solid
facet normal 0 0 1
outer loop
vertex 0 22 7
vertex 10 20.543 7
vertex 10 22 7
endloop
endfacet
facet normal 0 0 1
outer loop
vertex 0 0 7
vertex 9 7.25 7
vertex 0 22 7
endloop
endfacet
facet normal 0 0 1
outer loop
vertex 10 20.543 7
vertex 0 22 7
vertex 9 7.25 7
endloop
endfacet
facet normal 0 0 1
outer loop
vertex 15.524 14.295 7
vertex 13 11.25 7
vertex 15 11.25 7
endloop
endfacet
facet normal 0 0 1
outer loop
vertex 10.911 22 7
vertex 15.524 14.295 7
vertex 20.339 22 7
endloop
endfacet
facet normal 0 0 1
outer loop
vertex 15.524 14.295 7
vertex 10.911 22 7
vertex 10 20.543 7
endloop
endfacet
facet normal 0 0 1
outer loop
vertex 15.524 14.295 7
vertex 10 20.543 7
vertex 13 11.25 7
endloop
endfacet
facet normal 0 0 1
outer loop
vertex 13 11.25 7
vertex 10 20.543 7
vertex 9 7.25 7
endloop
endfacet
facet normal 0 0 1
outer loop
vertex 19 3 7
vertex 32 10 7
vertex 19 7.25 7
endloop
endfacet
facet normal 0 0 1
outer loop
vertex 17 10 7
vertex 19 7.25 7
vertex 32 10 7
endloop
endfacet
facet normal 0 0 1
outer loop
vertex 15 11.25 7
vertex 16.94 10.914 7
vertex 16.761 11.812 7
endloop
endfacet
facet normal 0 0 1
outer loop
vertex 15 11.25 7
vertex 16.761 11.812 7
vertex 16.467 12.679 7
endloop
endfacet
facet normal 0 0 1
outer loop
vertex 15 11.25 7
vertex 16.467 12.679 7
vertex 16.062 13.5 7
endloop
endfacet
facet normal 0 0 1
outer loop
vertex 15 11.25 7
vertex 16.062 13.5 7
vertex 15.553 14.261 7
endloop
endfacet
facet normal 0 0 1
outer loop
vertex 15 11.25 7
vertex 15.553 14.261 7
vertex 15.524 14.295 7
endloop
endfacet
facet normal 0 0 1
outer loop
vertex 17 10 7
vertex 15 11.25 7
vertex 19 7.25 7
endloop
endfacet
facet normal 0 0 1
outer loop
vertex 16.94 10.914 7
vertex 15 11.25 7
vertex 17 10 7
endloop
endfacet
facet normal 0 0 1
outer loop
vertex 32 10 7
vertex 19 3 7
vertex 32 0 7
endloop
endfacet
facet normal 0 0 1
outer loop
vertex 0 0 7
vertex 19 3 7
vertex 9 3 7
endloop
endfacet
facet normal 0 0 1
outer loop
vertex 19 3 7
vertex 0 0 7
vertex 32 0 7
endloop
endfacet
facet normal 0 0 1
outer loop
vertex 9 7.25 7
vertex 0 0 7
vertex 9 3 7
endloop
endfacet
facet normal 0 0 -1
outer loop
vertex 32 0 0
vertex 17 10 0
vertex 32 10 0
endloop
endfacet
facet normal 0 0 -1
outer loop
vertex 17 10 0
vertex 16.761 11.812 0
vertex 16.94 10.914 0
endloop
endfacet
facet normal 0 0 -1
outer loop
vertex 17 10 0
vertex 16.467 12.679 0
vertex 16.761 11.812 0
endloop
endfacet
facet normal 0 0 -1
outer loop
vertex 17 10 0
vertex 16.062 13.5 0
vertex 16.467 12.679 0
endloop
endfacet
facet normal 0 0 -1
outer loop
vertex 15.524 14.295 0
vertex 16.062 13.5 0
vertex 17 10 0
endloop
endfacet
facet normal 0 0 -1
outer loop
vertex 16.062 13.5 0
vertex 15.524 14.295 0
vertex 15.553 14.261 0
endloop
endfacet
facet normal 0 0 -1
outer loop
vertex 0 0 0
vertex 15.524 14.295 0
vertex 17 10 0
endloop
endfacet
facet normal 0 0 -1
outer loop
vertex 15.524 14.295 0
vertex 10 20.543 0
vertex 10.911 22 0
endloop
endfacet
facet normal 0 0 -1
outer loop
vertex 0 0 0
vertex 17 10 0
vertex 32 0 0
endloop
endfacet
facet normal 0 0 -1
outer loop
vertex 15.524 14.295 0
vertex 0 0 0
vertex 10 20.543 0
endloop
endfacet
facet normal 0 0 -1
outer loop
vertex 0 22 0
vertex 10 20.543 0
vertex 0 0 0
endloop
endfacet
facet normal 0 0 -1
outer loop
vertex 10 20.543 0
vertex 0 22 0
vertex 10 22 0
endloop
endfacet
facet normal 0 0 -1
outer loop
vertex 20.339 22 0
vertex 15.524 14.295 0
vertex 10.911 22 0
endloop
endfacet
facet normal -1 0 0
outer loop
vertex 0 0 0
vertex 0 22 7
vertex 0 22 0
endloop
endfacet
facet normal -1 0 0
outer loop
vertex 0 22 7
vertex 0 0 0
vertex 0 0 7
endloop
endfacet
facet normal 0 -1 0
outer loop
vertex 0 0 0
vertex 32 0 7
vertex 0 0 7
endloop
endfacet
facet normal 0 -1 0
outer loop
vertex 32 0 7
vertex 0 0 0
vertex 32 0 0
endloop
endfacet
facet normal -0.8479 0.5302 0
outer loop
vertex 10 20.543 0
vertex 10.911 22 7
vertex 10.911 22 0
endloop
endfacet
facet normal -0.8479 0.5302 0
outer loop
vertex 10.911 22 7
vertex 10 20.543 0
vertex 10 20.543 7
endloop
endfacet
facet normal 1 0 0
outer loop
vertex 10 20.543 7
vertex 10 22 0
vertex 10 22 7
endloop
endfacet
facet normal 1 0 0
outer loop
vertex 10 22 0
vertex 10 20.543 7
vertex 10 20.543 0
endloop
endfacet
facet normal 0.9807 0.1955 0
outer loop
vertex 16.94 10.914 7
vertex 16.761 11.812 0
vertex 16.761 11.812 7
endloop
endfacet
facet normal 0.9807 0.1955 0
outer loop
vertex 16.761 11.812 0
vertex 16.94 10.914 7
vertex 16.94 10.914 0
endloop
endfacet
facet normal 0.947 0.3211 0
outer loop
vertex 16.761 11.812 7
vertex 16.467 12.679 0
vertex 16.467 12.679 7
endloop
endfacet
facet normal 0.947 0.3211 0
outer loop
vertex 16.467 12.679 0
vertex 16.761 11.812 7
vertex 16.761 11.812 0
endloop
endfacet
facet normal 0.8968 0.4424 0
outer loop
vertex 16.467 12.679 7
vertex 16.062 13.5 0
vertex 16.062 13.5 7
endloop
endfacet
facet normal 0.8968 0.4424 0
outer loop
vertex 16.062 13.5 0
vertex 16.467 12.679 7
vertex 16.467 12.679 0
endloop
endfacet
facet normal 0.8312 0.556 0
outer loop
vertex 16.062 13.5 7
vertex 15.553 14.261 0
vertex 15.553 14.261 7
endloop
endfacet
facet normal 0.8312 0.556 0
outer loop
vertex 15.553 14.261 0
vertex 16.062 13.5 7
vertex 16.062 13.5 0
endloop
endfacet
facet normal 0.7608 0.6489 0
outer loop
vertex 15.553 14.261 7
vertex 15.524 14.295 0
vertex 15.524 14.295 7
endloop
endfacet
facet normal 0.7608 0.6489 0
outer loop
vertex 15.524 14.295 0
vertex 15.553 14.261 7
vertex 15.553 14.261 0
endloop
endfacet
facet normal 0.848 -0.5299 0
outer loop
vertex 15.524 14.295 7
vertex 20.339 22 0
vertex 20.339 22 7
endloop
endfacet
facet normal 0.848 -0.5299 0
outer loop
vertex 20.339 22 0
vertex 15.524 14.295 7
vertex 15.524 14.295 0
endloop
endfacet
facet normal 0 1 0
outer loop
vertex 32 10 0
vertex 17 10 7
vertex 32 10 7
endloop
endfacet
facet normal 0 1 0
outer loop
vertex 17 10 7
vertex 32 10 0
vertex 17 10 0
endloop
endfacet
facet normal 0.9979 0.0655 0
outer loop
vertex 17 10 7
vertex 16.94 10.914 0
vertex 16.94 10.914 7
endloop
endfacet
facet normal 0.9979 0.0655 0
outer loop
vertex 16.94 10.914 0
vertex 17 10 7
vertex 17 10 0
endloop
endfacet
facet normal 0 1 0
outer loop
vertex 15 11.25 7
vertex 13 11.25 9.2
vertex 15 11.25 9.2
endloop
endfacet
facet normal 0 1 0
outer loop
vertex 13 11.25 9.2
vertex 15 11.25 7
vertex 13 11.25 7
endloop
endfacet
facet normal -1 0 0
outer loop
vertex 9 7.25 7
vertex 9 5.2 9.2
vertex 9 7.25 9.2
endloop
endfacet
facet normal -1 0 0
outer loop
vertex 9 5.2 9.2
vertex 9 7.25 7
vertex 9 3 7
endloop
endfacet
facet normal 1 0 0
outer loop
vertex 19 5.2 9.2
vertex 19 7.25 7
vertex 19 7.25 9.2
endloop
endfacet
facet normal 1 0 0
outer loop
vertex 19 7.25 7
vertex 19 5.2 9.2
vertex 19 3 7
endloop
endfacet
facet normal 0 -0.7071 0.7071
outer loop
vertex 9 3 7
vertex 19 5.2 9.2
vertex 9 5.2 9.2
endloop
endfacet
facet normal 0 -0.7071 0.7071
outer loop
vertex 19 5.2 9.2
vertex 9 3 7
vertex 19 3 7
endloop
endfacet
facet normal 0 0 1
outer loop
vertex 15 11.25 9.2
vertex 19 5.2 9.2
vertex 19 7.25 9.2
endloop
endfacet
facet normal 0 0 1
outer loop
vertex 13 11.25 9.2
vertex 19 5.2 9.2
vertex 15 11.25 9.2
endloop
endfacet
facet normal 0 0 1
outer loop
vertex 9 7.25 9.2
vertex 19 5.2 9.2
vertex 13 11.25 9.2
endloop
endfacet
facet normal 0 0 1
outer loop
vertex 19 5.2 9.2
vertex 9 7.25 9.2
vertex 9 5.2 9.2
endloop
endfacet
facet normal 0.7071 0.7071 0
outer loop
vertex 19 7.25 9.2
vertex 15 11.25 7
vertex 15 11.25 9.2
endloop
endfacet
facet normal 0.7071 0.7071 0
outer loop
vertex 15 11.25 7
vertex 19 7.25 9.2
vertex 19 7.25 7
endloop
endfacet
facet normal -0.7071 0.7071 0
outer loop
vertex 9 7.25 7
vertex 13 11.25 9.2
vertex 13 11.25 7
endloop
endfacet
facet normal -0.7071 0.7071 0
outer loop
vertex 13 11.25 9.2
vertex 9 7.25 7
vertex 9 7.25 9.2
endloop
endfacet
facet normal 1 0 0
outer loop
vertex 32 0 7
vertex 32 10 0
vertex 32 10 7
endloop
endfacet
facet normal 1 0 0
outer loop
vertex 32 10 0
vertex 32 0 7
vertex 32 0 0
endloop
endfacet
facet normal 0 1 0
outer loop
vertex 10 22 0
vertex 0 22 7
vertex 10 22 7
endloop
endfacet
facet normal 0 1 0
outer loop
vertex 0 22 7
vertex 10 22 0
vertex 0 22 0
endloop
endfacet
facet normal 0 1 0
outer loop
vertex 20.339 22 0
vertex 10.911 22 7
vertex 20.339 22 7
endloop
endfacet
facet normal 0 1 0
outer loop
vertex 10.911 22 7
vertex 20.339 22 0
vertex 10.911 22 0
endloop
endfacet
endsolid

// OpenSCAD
// V6A experimental retained TPU foot. Units: mm.
// Default is ONE PLA coupon. Read V6A_README.md before printing.
// Full support preserves V5 height: with 2 mm sole assembled height is 243 mm.
// Full support is reference-only pending foot test and top/height reconciliation.
part = "coupon"; // coupon, foot, coupon_assembly, support_reference, support_assembly
$fn=48;

// Unchanged V5 geometry from original source.
W=150; H=234; T=7; frame=10; brace=8;
tab_w=22; tab_h=7; tab_t=7; tab_centers=[39,111];
module beam2d(x1,y1,x2,y2,w) {
 hull() { translate([x1,y1]) circle(d=w); translate([x2,y2]) circle(d=w); }
}
module frame2d() {
 union() {
  square([W,frame]); translate([0,H-frame]) square([W,frame]);
  translate([0,frame]) square([frame,H-2*frame]);
  translate([W-frame,frame]) square([frame,H-2*frame]);
  beam2d(frame-5,frame-5,W-frame+5,H-frame+5,brace);
  beam2d(W-frame+5,frame-5,frame-5,H-frame+5,brace);
  for(p=[[frame,frame],[W-frame,frame],[frame,H-frame],[W-frame,H-frame]])
   translate(p) circle(d=14);
 }
}
module base_support() {
 union() {
  linear_extrude(T) frame2d();
  for(c=tab_centers) translate([c-tab_w/2,H,0]) cube([tab_w,tab_h,tab_t]);
 }
}
// x along rail, y upward, z through rail thickness. Underside of rail: y=0.
sole=2;
wall=1.8;
clearance=0.25; // per face, UNCALIBRATED TPU trial; independent of PLA socket fit
catch_projection=2.2;
foot_length=28;
module cuboid(a,b) {translate(a) cube(b-a);}
module xy_prism(points,z0,z1) {translate([0,0,z0]) linear_extrude(z1-z0) polygon(points);}
module yz_prism(points,x0,x1) {
 multmatrix([[0,0,1,x0],[1,0,0,0],[0,1,0,0],[0,0,0,1]])
 linear_extrude(x1-x0) polygon(points);
}
module catch_left() {
 // 0.2 mm root overlap guarantees a volumetric connection.
 // 45 degree insertion ramp; roof follows TPU window for distributed retention.
 intersection() {
  yz_prism([[3,6.8],[11.25,6.8],[11.25,7+catch_projection],
            [3+catch_projection,7+catch_projection],[3,7]],9,19);
  xy_prism([[9,3],[19,3],[19,7.25],[15,11.25],[13,11.25],[9,7.25]],6.7,10);
 }
}
module support_new() {
 union() {
  base_support(); catch_left();
  translate([W,0,0]) mirror([1,0,0]) catch_left();
 }
}
module coupon() {intersection() {support_new();cuboid([0,0,0],[32,22,12]);}}
module foot_local() {
 difference() {
  union() {
   cuboid([-wall,-sole,-clearance-wall],[foot_length,0,7+clearance+wall]);
   cuboid([-wall,-.1,-clearance-wall],[foot_length,9,-clearance]);
   cuboid([-wall,-.1,7+clearance],[foot_length,14,7+clearance+wall]);
   cuboid([-wall,-.1,-clearance-wall],[-clearance,9,7+clearance+wall]);
  }
  // 45 degree roof narrows final bridge to 2 mm for sole-down printing.
  xy_prism([[9-clearance,3-clearance],[19+clearance,3-clearance],
            [19+clearance,7.25],[15,11.25+clearance],
            [13,11.25+clearance],[9-clearance,7.25]],7,12);
 }
}
module foot_print() {
 translate([wall,7+clearance+wall,sole]) rotate([90,0,0]) foot_local();
}
if(part=="coupon") coupon();
else if(part=="foot") foot_print();
else if(part=="coupon_assembly") {
 color("lightgray") coupon(); color("peru") foot_local();
} else if(part=="support_reference") support_new();
else if(part=="support_assembly") {
 color("lightgray") support_new();
 color("peru") {foot_local();translate([W,0,0]) mirror([1,0,0]) foot_local();}
} else assert(false,"Unknown part selector");
